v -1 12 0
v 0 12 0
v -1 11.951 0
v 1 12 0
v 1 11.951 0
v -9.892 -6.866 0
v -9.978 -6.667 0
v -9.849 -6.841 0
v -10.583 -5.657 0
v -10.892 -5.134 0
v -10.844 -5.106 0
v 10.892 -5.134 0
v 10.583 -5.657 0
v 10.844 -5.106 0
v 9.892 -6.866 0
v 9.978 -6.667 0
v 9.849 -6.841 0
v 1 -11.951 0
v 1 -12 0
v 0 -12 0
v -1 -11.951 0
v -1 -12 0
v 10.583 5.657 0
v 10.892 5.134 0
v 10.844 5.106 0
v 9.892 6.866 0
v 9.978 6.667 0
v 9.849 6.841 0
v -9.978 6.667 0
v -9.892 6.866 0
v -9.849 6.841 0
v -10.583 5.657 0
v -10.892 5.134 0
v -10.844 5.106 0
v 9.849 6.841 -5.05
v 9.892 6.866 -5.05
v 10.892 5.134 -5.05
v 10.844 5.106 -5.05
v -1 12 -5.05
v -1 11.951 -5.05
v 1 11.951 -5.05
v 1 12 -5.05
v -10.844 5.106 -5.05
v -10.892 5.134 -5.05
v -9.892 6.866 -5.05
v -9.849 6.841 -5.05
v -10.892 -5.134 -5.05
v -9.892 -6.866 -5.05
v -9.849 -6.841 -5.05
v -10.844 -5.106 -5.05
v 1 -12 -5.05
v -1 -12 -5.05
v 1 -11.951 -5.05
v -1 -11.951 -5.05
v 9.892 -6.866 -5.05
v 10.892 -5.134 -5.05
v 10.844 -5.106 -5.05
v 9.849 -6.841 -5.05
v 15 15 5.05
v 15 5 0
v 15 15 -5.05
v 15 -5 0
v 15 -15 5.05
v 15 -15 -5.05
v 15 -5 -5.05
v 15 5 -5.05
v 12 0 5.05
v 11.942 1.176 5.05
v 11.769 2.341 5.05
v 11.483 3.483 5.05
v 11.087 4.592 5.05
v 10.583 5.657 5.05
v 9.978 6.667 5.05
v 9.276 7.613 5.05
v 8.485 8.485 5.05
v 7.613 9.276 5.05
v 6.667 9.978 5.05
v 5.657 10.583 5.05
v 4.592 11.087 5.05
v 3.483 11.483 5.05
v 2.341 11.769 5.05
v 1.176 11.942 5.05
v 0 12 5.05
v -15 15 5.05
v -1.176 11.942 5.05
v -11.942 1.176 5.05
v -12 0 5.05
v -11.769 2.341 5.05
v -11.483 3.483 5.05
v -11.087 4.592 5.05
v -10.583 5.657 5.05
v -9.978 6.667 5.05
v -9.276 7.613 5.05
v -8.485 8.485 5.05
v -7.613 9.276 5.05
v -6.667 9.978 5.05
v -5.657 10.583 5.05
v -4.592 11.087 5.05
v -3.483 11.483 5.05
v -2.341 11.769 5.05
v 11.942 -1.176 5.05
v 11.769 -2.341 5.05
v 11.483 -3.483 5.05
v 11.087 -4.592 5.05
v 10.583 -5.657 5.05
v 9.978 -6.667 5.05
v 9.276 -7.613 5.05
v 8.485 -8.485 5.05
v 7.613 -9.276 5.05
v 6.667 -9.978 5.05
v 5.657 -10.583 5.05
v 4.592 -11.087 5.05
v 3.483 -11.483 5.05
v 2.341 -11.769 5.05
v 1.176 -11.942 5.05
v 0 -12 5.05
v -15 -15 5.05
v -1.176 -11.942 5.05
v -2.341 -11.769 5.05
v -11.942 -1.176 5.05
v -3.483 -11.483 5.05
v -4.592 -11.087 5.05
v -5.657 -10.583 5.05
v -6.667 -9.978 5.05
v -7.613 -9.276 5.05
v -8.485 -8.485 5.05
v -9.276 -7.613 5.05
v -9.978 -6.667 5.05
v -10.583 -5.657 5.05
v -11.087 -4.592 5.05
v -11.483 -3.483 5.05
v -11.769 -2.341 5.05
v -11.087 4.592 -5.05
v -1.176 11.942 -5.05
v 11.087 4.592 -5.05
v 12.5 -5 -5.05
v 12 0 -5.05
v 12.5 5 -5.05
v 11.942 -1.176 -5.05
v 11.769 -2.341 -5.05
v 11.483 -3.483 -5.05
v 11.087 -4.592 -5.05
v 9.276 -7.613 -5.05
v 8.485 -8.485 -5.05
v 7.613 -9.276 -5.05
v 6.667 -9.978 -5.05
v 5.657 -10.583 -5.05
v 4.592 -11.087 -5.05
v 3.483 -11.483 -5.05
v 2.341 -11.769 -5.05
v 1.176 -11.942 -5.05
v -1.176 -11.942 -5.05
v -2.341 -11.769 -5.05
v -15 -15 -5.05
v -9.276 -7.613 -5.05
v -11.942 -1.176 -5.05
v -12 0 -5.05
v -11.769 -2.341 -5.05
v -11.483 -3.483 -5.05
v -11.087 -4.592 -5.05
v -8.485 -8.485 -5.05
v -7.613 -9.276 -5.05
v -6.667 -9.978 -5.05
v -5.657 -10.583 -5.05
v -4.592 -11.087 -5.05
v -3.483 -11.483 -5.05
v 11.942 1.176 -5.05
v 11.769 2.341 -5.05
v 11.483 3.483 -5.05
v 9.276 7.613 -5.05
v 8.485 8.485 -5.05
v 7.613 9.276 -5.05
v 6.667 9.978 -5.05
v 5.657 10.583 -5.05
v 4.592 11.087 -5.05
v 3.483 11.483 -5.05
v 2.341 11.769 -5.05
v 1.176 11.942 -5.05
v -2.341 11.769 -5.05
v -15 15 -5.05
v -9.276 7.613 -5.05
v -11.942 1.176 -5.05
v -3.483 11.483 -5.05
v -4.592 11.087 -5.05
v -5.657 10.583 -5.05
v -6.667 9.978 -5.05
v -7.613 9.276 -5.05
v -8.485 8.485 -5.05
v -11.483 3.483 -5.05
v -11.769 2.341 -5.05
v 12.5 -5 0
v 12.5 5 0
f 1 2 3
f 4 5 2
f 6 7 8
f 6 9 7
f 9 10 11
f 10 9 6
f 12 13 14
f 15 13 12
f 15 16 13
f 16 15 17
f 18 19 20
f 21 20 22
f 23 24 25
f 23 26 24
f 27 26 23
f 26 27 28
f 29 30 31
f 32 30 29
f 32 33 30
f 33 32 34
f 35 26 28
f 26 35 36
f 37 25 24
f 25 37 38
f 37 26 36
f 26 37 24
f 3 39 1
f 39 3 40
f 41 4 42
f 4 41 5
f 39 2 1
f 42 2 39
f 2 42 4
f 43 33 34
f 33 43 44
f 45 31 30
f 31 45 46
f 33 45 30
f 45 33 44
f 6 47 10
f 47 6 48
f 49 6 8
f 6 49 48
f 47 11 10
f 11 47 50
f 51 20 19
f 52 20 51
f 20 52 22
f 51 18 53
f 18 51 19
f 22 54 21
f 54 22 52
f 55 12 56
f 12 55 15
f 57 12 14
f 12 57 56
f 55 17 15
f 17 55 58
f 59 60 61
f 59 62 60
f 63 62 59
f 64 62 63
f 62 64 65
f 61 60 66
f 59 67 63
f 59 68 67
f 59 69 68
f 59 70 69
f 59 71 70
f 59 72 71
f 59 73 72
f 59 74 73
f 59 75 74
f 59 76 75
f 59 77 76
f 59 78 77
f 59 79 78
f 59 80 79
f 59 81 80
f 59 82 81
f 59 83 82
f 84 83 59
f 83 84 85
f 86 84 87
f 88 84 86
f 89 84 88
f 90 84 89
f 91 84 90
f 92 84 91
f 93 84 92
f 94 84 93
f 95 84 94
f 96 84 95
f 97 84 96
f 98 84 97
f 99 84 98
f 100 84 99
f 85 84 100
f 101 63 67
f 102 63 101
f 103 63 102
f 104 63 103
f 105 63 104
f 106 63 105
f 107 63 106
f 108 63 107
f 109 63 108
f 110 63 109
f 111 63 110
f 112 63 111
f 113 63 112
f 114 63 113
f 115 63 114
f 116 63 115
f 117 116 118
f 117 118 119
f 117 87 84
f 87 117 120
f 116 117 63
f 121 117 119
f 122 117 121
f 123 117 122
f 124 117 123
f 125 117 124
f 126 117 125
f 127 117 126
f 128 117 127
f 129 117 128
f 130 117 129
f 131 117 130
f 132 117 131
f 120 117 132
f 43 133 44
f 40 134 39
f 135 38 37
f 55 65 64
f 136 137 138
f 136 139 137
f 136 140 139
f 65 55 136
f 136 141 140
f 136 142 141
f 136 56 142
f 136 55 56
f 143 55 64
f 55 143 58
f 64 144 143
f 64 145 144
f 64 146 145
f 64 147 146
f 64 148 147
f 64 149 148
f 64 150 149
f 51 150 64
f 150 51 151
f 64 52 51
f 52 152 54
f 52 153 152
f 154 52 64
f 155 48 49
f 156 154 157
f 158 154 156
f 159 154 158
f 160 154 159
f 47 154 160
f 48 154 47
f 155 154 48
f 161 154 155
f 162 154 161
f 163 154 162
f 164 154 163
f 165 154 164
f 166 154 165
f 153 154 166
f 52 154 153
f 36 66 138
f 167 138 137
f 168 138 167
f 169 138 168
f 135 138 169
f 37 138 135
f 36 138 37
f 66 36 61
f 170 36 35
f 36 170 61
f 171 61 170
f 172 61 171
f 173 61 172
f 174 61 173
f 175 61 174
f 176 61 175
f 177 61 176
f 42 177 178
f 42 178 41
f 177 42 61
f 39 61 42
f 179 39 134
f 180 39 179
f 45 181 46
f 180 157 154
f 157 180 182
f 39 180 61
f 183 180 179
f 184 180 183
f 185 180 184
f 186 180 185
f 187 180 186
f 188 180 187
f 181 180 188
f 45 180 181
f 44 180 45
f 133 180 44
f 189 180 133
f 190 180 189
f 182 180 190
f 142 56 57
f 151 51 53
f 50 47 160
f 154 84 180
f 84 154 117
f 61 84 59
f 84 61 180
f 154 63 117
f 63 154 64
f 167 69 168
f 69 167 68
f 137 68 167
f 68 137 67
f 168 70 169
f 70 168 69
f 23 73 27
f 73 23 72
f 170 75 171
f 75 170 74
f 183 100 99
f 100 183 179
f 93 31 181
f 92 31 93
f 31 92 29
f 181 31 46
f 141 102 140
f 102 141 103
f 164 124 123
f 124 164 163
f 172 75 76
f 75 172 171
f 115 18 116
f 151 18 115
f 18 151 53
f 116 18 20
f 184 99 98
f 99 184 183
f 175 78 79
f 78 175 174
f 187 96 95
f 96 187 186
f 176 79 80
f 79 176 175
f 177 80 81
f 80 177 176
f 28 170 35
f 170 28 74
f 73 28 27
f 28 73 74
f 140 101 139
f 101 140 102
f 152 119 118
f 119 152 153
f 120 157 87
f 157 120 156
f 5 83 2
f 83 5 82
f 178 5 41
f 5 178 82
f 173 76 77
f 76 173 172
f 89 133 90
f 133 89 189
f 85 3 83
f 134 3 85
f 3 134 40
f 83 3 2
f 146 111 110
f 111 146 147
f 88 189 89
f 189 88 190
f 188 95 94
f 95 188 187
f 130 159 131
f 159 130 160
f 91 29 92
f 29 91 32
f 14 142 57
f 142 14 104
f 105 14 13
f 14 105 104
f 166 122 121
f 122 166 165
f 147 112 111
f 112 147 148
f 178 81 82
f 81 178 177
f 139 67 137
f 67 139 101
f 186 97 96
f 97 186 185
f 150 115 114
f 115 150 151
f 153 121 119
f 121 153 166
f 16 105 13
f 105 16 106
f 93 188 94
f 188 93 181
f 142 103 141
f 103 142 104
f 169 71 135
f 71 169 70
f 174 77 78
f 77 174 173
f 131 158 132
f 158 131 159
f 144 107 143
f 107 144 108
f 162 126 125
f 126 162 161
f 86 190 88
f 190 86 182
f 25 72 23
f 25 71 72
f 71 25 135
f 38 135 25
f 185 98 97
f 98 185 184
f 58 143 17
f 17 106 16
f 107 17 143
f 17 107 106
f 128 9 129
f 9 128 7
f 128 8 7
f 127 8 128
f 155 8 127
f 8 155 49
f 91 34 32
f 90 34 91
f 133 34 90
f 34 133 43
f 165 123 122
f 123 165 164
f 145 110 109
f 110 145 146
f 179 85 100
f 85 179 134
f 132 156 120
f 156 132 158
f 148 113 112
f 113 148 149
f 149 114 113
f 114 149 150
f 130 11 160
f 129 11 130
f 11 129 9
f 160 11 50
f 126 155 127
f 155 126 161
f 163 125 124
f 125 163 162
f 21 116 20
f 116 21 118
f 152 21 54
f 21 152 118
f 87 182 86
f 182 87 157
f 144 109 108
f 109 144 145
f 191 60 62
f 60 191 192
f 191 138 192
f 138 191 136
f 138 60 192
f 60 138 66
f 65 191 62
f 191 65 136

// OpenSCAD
module centrifugal_blower_fan() {
    difference() {
        // Outer casing
        cube([30, 30, 10.1], center = true);
        
        // Inner cavity
        translate([0, 0, -5.05])
            cylinder(h = 10.1, r = 12, $fn = 64);
        
        // Air outlet
        translate([15, 0, -5.05])
            cube([5, 10, 10.1], center = true);
        
        // Fan blades
        for (i = [0:5]) {
            rotate([0, 0, i * 60])
                translate([0, 0, -5.05])
                    rotate([0, 0, 30])
                        translate([6, 0, 0])
                            cube([12, 2, 10.1], center = true);
        }
    }
}

centrifugal_blower_fan();
